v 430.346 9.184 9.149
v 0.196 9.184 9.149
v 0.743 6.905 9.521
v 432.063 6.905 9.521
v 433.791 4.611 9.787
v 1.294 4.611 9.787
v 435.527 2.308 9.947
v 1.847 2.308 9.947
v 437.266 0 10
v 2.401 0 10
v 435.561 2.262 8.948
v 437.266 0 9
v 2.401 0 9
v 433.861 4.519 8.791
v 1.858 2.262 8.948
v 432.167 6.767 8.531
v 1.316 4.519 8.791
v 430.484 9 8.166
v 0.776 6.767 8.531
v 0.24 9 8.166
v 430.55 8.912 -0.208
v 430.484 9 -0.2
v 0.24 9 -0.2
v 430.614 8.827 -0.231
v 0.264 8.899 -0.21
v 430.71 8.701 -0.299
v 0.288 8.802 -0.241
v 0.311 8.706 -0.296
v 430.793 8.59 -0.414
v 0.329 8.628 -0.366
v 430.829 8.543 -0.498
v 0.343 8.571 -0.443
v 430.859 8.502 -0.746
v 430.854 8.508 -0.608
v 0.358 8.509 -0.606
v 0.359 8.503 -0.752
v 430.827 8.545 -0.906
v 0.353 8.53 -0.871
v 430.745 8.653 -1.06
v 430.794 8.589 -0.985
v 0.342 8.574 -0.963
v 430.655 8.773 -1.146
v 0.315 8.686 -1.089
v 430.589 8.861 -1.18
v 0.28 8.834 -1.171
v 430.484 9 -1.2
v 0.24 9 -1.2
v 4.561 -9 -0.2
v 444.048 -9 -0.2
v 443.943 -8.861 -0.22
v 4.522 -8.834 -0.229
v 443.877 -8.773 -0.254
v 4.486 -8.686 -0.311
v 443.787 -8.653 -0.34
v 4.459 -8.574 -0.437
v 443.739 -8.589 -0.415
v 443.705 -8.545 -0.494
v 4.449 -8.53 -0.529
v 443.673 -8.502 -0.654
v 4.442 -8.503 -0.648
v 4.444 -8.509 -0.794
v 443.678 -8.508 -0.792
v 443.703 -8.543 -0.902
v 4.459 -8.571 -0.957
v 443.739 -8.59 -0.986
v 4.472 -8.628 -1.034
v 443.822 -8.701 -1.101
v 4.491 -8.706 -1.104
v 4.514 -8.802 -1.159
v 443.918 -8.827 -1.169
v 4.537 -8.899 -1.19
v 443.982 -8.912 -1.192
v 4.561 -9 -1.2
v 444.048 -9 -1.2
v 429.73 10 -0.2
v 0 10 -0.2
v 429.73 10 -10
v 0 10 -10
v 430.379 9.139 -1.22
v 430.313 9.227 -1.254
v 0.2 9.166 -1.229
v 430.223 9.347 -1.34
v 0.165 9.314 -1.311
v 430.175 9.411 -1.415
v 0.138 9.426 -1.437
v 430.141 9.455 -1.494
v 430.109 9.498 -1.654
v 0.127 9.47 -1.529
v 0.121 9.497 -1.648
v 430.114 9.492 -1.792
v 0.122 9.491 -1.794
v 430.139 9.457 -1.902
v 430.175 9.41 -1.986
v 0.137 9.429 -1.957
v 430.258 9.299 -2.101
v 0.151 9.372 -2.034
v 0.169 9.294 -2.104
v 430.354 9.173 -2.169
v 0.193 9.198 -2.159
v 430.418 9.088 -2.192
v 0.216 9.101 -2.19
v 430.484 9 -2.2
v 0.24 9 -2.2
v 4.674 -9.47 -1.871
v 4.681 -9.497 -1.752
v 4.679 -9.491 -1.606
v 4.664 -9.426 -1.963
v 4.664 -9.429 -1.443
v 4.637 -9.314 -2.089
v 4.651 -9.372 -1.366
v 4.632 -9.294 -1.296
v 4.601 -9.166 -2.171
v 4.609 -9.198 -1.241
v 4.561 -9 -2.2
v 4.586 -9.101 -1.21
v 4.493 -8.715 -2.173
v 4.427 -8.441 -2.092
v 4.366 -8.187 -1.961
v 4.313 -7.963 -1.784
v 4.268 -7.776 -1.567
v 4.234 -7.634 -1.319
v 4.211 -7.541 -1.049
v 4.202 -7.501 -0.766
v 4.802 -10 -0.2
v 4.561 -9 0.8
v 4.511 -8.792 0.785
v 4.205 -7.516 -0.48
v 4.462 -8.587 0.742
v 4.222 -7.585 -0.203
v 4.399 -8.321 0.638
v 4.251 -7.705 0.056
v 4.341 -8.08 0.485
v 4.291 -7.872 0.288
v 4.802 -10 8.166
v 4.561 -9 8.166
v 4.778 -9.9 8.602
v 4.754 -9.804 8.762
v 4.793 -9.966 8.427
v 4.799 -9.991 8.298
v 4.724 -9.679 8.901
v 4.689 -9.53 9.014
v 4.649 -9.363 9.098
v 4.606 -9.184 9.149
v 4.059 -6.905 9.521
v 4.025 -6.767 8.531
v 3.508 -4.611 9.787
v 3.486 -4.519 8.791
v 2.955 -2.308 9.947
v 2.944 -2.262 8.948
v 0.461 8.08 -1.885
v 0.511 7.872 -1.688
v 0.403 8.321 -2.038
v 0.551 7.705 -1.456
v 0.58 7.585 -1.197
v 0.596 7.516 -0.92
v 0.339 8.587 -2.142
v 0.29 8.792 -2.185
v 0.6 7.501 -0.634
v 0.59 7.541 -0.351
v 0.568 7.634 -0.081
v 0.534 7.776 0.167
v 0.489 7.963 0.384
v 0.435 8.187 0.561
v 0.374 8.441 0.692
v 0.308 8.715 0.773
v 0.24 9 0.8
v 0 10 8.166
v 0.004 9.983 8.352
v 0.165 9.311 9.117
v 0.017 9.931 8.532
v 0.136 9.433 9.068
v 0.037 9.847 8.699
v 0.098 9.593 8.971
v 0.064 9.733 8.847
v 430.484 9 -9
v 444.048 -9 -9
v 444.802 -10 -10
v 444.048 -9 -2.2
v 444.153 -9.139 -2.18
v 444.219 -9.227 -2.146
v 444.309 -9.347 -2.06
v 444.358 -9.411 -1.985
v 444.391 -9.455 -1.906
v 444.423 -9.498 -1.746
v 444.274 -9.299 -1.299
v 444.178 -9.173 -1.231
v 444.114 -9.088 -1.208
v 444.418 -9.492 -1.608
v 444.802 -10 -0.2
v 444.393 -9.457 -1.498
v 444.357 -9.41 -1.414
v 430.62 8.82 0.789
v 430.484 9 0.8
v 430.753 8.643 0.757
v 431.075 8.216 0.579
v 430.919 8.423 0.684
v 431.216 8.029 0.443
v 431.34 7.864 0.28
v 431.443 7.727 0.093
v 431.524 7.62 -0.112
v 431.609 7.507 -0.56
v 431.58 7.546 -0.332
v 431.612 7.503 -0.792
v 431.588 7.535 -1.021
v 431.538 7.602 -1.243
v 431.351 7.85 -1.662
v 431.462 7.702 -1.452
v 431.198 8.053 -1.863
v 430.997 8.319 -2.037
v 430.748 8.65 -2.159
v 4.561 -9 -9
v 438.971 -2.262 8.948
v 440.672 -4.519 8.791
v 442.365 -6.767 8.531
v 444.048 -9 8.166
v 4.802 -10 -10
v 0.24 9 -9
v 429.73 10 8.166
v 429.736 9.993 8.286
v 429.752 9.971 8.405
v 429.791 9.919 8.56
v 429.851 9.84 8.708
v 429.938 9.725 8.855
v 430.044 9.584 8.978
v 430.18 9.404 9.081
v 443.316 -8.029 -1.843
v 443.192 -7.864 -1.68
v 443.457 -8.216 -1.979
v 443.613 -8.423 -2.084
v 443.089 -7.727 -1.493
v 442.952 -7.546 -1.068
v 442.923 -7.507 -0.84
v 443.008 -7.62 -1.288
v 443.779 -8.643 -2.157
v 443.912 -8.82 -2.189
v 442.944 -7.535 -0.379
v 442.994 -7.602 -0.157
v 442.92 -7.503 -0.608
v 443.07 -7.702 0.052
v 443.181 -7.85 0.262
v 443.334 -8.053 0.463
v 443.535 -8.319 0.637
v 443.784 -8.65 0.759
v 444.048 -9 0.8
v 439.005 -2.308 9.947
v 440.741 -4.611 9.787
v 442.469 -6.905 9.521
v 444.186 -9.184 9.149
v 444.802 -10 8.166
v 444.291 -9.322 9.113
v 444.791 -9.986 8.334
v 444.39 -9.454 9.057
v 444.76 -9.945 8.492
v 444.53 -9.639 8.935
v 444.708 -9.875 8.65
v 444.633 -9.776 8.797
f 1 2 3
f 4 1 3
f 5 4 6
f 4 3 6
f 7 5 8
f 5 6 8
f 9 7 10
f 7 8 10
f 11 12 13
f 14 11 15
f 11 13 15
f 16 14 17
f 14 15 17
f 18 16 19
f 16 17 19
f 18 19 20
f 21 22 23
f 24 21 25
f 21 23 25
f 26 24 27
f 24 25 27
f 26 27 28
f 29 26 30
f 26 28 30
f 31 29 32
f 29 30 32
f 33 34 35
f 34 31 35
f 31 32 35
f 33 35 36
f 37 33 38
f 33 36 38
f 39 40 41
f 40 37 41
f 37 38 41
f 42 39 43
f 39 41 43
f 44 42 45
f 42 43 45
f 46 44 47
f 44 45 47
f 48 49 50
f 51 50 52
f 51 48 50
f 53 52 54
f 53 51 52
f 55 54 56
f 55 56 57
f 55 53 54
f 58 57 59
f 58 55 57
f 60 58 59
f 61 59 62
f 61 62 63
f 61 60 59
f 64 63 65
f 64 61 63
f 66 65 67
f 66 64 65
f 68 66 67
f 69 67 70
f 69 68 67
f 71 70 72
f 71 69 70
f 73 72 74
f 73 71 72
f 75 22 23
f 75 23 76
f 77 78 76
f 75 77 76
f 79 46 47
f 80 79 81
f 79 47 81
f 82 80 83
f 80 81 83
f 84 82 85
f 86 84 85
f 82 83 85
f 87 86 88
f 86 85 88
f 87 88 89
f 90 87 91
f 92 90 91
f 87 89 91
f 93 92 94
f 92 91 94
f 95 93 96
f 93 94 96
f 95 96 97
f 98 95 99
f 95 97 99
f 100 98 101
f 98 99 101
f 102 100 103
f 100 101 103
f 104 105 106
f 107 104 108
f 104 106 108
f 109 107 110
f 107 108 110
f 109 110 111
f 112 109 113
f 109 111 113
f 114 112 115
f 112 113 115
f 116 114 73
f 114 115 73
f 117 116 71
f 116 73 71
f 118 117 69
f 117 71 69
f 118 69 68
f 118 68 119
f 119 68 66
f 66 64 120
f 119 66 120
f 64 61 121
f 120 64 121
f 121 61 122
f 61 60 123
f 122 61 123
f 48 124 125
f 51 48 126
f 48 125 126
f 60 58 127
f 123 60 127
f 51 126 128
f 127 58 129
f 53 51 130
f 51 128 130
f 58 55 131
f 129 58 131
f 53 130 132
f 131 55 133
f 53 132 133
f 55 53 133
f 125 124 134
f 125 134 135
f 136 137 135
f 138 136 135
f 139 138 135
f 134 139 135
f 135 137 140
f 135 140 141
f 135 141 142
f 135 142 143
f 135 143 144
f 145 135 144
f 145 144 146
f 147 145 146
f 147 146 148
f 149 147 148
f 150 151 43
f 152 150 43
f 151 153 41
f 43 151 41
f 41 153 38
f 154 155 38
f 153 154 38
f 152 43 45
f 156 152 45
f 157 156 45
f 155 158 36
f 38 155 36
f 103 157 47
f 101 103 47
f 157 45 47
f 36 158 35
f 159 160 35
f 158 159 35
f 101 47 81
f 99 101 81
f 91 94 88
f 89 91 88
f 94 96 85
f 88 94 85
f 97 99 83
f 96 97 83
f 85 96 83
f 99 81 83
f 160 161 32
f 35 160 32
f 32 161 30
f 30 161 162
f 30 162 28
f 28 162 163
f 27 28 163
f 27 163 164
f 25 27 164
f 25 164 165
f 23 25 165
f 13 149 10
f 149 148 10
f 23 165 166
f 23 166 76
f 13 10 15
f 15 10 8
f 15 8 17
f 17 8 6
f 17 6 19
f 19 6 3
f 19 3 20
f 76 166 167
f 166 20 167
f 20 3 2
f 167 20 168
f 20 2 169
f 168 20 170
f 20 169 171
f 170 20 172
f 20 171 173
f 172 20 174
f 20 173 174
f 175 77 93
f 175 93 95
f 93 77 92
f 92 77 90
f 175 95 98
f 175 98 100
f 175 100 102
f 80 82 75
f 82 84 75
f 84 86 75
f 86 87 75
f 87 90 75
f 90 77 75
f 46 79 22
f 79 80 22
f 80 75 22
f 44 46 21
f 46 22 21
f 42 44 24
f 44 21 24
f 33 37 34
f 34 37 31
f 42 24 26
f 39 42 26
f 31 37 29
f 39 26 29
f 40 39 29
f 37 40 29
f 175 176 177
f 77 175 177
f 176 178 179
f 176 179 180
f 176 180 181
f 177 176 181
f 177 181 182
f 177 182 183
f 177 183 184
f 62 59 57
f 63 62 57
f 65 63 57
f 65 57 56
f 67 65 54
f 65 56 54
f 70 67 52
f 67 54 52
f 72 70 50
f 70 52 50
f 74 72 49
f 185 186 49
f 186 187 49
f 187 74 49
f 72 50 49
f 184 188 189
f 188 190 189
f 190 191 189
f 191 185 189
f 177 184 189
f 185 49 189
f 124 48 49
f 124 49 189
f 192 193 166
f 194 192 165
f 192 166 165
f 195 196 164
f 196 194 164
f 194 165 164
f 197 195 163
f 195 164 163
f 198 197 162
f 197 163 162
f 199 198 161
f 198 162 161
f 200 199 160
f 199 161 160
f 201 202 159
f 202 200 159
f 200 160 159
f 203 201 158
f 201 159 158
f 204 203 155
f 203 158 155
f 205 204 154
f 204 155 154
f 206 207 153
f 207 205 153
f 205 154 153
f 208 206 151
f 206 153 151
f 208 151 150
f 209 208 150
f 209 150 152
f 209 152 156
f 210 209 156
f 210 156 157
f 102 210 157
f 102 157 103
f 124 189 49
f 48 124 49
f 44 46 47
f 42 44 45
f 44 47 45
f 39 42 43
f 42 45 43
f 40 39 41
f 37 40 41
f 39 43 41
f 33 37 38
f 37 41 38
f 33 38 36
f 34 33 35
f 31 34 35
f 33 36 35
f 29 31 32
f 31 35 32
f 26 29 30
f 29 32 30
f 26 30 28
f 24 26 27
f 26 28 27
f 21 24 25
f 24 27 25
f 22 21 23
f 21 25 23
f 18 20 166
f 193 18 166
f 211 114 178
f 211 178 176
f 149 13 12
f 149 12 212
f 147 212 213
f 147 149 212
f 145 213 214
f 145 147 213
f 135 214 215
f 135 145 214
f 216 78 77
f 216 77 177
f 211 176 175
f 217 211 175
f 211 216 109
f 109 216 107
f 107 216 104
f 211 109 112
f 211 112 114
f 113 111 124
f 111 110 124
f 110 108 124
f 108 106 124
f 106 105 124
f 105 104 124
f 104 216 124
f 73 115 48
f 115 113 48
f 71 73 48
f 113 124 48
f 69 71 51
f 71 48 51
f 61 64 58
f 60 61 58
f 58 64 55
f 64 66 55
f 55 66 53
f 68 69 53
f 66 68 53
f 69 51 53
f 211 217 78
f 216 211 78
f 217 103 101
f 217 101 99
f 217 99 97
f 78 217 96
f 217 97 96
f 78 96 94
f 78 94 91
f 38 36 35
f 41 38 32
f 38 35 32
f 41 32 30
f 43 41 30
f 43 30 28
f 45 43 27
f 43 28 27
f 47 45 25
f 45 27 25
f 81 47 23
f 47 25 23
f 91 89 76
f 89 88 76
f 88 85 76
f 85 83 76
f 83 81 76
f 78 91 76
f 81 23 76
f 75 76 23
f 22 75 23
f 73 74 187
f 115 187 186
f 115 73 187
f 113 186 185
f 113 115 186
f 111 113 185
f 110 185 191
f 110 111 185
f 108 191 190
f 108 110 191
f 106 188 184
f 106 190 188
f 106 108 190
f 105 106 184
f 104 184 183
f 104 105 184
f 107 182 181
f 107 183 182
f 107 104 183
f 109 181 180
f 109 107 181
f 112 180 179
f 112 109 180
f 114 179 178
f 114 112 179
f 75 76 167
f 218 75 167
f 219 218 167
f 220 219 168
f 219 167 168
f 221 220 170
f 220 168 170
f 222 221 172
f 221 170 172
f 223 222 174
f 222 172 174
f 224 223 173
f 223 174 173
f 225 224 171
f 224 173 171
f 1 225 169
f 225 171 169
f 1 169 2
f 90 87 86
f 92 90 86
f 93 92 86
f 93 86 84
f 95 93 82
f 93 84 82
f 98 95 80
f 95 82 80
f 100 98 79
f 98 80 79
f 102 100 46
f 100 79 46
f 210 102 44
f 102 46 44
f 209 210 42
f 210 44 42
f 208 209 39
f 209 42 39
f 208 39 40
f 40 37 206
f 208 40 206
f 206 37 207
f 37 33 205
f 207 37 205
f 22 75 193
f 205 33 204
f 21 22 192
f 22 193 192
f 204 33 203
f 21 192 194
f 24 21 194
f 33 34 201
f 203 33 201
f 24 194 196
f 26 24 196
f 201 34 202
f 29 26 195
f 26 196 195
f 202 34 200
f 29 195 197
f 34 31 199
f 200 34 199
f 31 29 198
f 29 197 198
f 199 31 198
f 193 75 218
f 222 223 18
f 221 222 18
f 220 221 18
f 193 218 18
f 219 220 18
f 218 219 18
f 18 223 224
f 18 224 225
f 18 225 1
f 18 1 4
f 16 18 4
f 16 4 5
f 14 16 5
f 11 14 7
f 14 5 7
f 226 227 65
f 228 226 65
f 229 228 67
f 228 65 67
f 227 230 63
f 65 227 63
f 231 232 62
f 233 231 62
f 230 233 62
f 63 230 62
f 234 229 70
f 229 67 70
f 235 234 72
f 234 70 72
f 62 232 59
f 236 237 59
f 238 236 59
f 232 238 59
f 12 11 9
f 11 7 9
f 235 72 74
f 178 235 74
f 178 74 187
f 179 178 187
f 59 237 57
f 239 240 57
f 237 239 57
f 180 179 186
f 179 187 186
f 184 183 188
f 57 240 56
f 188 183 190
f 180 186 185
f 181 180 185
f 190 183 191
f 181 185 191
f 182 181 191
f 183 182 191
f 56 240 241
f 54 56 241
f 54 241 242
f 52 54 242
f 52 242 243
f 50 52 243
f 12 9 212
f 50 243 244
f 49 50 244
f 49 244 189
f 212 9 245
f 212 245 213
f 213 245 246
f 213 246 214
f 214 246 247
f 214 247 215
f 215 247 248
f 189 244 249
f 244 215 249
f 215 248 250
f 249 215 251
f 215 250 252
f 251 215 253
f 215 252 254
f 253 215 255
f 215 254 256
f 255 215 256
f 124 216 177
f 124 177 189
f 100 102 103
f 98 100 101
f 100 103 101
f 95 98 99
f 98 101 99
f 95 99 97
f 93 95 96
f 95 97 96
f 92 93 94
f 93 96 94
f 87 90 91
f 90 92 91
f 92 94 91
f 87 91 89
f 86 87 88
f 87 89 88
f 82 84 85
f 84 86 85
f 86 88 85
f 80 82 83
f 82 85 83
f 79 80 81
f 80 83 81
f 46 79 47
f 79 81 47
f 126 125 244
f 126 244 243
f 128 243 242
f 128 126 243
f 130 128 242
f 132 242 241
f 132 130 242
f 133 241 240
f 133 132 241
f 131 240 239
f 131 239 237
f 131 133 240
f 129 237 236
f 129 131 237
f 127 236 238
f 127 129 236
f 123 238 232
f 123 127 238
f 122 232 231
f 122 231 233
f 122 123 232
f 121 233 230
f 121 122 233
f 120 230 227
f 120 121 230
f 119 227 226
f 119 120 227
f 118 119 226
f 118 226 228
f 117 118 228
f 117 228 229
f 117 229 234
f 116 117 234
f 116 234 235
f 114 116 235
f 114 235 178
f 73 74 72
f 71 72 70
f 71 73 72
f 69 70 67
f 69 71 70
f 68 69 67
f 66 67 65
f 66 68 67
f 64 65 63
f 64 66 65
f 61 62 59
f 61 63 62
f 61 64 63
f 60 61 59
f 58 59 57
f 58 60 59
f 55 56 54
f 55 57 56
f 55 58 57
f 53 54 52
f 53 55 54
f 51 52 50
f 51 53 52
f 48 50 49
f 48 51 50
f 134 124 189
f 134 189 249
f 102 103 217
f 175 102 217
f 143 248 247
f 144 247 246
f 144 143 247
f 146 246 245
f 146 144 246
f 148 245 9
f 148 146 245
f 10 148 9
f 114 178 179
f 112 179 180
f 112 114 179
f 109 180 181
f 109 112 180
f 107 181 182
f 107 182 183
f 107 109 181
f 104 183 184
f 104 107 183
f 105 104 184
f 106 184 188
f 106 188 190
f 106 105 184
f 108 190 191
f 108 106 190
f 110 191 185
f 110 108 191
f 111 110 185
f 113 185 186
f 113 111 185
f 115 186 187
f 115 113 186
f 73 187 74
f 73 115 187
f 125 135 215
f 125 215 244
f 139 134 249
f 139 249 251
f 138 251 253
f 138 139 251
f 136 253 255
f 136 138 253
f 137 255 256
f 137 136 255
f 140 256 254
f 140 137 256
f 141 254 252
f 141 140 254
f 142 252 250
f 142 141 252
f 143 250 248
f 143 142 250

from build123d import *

# Parameters (mm, degrees)
F2_DEPTH      = 1000
F4_DEPTH      = 1000
F8_DEPTH      = 10.001
F8_DEPTH_BACK = 10.001


with BuildPart() as f2:
    # F1 (on Right) → F2 (new body)
    with BuildSketch(Plane.YZ):
        with BuildLine():
            Line((0, -9), (0, -10))
            Line((0, -10), (10, -10))
            Line((10, -10), (10, -0.2))
            Line((10, -0.2), (9, -0.2))
            ThreePointArc((9, -0.2), (8.5, -0.7), (9, -1.2))
            ThreePointArc((9, -1.2), (9.5, -1.7), (9, -2.2))
            Line((9, -2.2), (9, -9))
            Line((9, -9), (0, -9))
        make_face()
    extrude(amount=F2_DEPTH)

    # F5: F2 across plane


with BuildPart() as f4:
    # F3 (on Right) → F4 (new body)
    with BuildSketch(Plane.YZ):
        with BuildLine():
            Line((9, -0.2), (10, -0.2))
            Line((10, -0.2), (10, 8.1663783152))
            ThreePointArc((10, 8.1663783152), (9.7693092582, 8.8052548802), (9.1836734694, 9.1493656277))
            ThreePointArc((9.1836734694, 9.1493656277), (4.6114920912, 9.7868872364), (0, 10))
            Line((0, 10), (0, 9))
            ThreePointArc((0, 9), (4.5192622493, 8.7911494917), (9, 8.1663783152))
            Line((9, 8.1663783152), (9, 0.8))
            ThreePointArc((9, 0.8), (7.5, -0.7), (9, -2.2))
            ThreePointArc((9, -2.2), (9.5, -1.7), (9, -1.2))
            ThreePointArc((9, -1.2), (8.5, -0.7), (9, -0.2))
        make_face()
    extrude(amount=F4_DEPTH)

    # F6: F4 across plane


with BuildPart() as f2_1:
    add(f2.part)
    add(f2.part.mirror(Plane.XZ))


with BuildPart() as f4_1:
    add(f4.part)
    add(f4.part.mirror(Plane.XZ))


with BuildPart() as f8_tool:
    # F7 (on Top) → F8 (new body, two sides)
    with BuildSketch(Plane.XY) as f8_sk:
        Polygon((0, 10), (0, 0), (0, -10), (4.8015751816, -10), align=None)
        Polygon((444.8015751816, 10), (429.7304941795, 10), (444.8015751816, -10), (1016.9613361359, -10), (1016.9613361359, 10), align=None)
    extrude(amount=F8_DEPTH)
    extrude(f8_sk.sketch, amount=-F8_DEPTH_BACK)


with BuildPart() as f2_2:
    add(f2_1.part)

    # F8: cut by f8_tool
    add(f8_tool.part, mode=Mode.SUBTRACT)


with BuildPart() as f4_2:
    add(f4_1.part)

    # F8: cut by f8_tool
    add(f8_tool.part, mode=Mode.SUBTRACT)


solid = Compound([f2_2.part, f4_2.part])
